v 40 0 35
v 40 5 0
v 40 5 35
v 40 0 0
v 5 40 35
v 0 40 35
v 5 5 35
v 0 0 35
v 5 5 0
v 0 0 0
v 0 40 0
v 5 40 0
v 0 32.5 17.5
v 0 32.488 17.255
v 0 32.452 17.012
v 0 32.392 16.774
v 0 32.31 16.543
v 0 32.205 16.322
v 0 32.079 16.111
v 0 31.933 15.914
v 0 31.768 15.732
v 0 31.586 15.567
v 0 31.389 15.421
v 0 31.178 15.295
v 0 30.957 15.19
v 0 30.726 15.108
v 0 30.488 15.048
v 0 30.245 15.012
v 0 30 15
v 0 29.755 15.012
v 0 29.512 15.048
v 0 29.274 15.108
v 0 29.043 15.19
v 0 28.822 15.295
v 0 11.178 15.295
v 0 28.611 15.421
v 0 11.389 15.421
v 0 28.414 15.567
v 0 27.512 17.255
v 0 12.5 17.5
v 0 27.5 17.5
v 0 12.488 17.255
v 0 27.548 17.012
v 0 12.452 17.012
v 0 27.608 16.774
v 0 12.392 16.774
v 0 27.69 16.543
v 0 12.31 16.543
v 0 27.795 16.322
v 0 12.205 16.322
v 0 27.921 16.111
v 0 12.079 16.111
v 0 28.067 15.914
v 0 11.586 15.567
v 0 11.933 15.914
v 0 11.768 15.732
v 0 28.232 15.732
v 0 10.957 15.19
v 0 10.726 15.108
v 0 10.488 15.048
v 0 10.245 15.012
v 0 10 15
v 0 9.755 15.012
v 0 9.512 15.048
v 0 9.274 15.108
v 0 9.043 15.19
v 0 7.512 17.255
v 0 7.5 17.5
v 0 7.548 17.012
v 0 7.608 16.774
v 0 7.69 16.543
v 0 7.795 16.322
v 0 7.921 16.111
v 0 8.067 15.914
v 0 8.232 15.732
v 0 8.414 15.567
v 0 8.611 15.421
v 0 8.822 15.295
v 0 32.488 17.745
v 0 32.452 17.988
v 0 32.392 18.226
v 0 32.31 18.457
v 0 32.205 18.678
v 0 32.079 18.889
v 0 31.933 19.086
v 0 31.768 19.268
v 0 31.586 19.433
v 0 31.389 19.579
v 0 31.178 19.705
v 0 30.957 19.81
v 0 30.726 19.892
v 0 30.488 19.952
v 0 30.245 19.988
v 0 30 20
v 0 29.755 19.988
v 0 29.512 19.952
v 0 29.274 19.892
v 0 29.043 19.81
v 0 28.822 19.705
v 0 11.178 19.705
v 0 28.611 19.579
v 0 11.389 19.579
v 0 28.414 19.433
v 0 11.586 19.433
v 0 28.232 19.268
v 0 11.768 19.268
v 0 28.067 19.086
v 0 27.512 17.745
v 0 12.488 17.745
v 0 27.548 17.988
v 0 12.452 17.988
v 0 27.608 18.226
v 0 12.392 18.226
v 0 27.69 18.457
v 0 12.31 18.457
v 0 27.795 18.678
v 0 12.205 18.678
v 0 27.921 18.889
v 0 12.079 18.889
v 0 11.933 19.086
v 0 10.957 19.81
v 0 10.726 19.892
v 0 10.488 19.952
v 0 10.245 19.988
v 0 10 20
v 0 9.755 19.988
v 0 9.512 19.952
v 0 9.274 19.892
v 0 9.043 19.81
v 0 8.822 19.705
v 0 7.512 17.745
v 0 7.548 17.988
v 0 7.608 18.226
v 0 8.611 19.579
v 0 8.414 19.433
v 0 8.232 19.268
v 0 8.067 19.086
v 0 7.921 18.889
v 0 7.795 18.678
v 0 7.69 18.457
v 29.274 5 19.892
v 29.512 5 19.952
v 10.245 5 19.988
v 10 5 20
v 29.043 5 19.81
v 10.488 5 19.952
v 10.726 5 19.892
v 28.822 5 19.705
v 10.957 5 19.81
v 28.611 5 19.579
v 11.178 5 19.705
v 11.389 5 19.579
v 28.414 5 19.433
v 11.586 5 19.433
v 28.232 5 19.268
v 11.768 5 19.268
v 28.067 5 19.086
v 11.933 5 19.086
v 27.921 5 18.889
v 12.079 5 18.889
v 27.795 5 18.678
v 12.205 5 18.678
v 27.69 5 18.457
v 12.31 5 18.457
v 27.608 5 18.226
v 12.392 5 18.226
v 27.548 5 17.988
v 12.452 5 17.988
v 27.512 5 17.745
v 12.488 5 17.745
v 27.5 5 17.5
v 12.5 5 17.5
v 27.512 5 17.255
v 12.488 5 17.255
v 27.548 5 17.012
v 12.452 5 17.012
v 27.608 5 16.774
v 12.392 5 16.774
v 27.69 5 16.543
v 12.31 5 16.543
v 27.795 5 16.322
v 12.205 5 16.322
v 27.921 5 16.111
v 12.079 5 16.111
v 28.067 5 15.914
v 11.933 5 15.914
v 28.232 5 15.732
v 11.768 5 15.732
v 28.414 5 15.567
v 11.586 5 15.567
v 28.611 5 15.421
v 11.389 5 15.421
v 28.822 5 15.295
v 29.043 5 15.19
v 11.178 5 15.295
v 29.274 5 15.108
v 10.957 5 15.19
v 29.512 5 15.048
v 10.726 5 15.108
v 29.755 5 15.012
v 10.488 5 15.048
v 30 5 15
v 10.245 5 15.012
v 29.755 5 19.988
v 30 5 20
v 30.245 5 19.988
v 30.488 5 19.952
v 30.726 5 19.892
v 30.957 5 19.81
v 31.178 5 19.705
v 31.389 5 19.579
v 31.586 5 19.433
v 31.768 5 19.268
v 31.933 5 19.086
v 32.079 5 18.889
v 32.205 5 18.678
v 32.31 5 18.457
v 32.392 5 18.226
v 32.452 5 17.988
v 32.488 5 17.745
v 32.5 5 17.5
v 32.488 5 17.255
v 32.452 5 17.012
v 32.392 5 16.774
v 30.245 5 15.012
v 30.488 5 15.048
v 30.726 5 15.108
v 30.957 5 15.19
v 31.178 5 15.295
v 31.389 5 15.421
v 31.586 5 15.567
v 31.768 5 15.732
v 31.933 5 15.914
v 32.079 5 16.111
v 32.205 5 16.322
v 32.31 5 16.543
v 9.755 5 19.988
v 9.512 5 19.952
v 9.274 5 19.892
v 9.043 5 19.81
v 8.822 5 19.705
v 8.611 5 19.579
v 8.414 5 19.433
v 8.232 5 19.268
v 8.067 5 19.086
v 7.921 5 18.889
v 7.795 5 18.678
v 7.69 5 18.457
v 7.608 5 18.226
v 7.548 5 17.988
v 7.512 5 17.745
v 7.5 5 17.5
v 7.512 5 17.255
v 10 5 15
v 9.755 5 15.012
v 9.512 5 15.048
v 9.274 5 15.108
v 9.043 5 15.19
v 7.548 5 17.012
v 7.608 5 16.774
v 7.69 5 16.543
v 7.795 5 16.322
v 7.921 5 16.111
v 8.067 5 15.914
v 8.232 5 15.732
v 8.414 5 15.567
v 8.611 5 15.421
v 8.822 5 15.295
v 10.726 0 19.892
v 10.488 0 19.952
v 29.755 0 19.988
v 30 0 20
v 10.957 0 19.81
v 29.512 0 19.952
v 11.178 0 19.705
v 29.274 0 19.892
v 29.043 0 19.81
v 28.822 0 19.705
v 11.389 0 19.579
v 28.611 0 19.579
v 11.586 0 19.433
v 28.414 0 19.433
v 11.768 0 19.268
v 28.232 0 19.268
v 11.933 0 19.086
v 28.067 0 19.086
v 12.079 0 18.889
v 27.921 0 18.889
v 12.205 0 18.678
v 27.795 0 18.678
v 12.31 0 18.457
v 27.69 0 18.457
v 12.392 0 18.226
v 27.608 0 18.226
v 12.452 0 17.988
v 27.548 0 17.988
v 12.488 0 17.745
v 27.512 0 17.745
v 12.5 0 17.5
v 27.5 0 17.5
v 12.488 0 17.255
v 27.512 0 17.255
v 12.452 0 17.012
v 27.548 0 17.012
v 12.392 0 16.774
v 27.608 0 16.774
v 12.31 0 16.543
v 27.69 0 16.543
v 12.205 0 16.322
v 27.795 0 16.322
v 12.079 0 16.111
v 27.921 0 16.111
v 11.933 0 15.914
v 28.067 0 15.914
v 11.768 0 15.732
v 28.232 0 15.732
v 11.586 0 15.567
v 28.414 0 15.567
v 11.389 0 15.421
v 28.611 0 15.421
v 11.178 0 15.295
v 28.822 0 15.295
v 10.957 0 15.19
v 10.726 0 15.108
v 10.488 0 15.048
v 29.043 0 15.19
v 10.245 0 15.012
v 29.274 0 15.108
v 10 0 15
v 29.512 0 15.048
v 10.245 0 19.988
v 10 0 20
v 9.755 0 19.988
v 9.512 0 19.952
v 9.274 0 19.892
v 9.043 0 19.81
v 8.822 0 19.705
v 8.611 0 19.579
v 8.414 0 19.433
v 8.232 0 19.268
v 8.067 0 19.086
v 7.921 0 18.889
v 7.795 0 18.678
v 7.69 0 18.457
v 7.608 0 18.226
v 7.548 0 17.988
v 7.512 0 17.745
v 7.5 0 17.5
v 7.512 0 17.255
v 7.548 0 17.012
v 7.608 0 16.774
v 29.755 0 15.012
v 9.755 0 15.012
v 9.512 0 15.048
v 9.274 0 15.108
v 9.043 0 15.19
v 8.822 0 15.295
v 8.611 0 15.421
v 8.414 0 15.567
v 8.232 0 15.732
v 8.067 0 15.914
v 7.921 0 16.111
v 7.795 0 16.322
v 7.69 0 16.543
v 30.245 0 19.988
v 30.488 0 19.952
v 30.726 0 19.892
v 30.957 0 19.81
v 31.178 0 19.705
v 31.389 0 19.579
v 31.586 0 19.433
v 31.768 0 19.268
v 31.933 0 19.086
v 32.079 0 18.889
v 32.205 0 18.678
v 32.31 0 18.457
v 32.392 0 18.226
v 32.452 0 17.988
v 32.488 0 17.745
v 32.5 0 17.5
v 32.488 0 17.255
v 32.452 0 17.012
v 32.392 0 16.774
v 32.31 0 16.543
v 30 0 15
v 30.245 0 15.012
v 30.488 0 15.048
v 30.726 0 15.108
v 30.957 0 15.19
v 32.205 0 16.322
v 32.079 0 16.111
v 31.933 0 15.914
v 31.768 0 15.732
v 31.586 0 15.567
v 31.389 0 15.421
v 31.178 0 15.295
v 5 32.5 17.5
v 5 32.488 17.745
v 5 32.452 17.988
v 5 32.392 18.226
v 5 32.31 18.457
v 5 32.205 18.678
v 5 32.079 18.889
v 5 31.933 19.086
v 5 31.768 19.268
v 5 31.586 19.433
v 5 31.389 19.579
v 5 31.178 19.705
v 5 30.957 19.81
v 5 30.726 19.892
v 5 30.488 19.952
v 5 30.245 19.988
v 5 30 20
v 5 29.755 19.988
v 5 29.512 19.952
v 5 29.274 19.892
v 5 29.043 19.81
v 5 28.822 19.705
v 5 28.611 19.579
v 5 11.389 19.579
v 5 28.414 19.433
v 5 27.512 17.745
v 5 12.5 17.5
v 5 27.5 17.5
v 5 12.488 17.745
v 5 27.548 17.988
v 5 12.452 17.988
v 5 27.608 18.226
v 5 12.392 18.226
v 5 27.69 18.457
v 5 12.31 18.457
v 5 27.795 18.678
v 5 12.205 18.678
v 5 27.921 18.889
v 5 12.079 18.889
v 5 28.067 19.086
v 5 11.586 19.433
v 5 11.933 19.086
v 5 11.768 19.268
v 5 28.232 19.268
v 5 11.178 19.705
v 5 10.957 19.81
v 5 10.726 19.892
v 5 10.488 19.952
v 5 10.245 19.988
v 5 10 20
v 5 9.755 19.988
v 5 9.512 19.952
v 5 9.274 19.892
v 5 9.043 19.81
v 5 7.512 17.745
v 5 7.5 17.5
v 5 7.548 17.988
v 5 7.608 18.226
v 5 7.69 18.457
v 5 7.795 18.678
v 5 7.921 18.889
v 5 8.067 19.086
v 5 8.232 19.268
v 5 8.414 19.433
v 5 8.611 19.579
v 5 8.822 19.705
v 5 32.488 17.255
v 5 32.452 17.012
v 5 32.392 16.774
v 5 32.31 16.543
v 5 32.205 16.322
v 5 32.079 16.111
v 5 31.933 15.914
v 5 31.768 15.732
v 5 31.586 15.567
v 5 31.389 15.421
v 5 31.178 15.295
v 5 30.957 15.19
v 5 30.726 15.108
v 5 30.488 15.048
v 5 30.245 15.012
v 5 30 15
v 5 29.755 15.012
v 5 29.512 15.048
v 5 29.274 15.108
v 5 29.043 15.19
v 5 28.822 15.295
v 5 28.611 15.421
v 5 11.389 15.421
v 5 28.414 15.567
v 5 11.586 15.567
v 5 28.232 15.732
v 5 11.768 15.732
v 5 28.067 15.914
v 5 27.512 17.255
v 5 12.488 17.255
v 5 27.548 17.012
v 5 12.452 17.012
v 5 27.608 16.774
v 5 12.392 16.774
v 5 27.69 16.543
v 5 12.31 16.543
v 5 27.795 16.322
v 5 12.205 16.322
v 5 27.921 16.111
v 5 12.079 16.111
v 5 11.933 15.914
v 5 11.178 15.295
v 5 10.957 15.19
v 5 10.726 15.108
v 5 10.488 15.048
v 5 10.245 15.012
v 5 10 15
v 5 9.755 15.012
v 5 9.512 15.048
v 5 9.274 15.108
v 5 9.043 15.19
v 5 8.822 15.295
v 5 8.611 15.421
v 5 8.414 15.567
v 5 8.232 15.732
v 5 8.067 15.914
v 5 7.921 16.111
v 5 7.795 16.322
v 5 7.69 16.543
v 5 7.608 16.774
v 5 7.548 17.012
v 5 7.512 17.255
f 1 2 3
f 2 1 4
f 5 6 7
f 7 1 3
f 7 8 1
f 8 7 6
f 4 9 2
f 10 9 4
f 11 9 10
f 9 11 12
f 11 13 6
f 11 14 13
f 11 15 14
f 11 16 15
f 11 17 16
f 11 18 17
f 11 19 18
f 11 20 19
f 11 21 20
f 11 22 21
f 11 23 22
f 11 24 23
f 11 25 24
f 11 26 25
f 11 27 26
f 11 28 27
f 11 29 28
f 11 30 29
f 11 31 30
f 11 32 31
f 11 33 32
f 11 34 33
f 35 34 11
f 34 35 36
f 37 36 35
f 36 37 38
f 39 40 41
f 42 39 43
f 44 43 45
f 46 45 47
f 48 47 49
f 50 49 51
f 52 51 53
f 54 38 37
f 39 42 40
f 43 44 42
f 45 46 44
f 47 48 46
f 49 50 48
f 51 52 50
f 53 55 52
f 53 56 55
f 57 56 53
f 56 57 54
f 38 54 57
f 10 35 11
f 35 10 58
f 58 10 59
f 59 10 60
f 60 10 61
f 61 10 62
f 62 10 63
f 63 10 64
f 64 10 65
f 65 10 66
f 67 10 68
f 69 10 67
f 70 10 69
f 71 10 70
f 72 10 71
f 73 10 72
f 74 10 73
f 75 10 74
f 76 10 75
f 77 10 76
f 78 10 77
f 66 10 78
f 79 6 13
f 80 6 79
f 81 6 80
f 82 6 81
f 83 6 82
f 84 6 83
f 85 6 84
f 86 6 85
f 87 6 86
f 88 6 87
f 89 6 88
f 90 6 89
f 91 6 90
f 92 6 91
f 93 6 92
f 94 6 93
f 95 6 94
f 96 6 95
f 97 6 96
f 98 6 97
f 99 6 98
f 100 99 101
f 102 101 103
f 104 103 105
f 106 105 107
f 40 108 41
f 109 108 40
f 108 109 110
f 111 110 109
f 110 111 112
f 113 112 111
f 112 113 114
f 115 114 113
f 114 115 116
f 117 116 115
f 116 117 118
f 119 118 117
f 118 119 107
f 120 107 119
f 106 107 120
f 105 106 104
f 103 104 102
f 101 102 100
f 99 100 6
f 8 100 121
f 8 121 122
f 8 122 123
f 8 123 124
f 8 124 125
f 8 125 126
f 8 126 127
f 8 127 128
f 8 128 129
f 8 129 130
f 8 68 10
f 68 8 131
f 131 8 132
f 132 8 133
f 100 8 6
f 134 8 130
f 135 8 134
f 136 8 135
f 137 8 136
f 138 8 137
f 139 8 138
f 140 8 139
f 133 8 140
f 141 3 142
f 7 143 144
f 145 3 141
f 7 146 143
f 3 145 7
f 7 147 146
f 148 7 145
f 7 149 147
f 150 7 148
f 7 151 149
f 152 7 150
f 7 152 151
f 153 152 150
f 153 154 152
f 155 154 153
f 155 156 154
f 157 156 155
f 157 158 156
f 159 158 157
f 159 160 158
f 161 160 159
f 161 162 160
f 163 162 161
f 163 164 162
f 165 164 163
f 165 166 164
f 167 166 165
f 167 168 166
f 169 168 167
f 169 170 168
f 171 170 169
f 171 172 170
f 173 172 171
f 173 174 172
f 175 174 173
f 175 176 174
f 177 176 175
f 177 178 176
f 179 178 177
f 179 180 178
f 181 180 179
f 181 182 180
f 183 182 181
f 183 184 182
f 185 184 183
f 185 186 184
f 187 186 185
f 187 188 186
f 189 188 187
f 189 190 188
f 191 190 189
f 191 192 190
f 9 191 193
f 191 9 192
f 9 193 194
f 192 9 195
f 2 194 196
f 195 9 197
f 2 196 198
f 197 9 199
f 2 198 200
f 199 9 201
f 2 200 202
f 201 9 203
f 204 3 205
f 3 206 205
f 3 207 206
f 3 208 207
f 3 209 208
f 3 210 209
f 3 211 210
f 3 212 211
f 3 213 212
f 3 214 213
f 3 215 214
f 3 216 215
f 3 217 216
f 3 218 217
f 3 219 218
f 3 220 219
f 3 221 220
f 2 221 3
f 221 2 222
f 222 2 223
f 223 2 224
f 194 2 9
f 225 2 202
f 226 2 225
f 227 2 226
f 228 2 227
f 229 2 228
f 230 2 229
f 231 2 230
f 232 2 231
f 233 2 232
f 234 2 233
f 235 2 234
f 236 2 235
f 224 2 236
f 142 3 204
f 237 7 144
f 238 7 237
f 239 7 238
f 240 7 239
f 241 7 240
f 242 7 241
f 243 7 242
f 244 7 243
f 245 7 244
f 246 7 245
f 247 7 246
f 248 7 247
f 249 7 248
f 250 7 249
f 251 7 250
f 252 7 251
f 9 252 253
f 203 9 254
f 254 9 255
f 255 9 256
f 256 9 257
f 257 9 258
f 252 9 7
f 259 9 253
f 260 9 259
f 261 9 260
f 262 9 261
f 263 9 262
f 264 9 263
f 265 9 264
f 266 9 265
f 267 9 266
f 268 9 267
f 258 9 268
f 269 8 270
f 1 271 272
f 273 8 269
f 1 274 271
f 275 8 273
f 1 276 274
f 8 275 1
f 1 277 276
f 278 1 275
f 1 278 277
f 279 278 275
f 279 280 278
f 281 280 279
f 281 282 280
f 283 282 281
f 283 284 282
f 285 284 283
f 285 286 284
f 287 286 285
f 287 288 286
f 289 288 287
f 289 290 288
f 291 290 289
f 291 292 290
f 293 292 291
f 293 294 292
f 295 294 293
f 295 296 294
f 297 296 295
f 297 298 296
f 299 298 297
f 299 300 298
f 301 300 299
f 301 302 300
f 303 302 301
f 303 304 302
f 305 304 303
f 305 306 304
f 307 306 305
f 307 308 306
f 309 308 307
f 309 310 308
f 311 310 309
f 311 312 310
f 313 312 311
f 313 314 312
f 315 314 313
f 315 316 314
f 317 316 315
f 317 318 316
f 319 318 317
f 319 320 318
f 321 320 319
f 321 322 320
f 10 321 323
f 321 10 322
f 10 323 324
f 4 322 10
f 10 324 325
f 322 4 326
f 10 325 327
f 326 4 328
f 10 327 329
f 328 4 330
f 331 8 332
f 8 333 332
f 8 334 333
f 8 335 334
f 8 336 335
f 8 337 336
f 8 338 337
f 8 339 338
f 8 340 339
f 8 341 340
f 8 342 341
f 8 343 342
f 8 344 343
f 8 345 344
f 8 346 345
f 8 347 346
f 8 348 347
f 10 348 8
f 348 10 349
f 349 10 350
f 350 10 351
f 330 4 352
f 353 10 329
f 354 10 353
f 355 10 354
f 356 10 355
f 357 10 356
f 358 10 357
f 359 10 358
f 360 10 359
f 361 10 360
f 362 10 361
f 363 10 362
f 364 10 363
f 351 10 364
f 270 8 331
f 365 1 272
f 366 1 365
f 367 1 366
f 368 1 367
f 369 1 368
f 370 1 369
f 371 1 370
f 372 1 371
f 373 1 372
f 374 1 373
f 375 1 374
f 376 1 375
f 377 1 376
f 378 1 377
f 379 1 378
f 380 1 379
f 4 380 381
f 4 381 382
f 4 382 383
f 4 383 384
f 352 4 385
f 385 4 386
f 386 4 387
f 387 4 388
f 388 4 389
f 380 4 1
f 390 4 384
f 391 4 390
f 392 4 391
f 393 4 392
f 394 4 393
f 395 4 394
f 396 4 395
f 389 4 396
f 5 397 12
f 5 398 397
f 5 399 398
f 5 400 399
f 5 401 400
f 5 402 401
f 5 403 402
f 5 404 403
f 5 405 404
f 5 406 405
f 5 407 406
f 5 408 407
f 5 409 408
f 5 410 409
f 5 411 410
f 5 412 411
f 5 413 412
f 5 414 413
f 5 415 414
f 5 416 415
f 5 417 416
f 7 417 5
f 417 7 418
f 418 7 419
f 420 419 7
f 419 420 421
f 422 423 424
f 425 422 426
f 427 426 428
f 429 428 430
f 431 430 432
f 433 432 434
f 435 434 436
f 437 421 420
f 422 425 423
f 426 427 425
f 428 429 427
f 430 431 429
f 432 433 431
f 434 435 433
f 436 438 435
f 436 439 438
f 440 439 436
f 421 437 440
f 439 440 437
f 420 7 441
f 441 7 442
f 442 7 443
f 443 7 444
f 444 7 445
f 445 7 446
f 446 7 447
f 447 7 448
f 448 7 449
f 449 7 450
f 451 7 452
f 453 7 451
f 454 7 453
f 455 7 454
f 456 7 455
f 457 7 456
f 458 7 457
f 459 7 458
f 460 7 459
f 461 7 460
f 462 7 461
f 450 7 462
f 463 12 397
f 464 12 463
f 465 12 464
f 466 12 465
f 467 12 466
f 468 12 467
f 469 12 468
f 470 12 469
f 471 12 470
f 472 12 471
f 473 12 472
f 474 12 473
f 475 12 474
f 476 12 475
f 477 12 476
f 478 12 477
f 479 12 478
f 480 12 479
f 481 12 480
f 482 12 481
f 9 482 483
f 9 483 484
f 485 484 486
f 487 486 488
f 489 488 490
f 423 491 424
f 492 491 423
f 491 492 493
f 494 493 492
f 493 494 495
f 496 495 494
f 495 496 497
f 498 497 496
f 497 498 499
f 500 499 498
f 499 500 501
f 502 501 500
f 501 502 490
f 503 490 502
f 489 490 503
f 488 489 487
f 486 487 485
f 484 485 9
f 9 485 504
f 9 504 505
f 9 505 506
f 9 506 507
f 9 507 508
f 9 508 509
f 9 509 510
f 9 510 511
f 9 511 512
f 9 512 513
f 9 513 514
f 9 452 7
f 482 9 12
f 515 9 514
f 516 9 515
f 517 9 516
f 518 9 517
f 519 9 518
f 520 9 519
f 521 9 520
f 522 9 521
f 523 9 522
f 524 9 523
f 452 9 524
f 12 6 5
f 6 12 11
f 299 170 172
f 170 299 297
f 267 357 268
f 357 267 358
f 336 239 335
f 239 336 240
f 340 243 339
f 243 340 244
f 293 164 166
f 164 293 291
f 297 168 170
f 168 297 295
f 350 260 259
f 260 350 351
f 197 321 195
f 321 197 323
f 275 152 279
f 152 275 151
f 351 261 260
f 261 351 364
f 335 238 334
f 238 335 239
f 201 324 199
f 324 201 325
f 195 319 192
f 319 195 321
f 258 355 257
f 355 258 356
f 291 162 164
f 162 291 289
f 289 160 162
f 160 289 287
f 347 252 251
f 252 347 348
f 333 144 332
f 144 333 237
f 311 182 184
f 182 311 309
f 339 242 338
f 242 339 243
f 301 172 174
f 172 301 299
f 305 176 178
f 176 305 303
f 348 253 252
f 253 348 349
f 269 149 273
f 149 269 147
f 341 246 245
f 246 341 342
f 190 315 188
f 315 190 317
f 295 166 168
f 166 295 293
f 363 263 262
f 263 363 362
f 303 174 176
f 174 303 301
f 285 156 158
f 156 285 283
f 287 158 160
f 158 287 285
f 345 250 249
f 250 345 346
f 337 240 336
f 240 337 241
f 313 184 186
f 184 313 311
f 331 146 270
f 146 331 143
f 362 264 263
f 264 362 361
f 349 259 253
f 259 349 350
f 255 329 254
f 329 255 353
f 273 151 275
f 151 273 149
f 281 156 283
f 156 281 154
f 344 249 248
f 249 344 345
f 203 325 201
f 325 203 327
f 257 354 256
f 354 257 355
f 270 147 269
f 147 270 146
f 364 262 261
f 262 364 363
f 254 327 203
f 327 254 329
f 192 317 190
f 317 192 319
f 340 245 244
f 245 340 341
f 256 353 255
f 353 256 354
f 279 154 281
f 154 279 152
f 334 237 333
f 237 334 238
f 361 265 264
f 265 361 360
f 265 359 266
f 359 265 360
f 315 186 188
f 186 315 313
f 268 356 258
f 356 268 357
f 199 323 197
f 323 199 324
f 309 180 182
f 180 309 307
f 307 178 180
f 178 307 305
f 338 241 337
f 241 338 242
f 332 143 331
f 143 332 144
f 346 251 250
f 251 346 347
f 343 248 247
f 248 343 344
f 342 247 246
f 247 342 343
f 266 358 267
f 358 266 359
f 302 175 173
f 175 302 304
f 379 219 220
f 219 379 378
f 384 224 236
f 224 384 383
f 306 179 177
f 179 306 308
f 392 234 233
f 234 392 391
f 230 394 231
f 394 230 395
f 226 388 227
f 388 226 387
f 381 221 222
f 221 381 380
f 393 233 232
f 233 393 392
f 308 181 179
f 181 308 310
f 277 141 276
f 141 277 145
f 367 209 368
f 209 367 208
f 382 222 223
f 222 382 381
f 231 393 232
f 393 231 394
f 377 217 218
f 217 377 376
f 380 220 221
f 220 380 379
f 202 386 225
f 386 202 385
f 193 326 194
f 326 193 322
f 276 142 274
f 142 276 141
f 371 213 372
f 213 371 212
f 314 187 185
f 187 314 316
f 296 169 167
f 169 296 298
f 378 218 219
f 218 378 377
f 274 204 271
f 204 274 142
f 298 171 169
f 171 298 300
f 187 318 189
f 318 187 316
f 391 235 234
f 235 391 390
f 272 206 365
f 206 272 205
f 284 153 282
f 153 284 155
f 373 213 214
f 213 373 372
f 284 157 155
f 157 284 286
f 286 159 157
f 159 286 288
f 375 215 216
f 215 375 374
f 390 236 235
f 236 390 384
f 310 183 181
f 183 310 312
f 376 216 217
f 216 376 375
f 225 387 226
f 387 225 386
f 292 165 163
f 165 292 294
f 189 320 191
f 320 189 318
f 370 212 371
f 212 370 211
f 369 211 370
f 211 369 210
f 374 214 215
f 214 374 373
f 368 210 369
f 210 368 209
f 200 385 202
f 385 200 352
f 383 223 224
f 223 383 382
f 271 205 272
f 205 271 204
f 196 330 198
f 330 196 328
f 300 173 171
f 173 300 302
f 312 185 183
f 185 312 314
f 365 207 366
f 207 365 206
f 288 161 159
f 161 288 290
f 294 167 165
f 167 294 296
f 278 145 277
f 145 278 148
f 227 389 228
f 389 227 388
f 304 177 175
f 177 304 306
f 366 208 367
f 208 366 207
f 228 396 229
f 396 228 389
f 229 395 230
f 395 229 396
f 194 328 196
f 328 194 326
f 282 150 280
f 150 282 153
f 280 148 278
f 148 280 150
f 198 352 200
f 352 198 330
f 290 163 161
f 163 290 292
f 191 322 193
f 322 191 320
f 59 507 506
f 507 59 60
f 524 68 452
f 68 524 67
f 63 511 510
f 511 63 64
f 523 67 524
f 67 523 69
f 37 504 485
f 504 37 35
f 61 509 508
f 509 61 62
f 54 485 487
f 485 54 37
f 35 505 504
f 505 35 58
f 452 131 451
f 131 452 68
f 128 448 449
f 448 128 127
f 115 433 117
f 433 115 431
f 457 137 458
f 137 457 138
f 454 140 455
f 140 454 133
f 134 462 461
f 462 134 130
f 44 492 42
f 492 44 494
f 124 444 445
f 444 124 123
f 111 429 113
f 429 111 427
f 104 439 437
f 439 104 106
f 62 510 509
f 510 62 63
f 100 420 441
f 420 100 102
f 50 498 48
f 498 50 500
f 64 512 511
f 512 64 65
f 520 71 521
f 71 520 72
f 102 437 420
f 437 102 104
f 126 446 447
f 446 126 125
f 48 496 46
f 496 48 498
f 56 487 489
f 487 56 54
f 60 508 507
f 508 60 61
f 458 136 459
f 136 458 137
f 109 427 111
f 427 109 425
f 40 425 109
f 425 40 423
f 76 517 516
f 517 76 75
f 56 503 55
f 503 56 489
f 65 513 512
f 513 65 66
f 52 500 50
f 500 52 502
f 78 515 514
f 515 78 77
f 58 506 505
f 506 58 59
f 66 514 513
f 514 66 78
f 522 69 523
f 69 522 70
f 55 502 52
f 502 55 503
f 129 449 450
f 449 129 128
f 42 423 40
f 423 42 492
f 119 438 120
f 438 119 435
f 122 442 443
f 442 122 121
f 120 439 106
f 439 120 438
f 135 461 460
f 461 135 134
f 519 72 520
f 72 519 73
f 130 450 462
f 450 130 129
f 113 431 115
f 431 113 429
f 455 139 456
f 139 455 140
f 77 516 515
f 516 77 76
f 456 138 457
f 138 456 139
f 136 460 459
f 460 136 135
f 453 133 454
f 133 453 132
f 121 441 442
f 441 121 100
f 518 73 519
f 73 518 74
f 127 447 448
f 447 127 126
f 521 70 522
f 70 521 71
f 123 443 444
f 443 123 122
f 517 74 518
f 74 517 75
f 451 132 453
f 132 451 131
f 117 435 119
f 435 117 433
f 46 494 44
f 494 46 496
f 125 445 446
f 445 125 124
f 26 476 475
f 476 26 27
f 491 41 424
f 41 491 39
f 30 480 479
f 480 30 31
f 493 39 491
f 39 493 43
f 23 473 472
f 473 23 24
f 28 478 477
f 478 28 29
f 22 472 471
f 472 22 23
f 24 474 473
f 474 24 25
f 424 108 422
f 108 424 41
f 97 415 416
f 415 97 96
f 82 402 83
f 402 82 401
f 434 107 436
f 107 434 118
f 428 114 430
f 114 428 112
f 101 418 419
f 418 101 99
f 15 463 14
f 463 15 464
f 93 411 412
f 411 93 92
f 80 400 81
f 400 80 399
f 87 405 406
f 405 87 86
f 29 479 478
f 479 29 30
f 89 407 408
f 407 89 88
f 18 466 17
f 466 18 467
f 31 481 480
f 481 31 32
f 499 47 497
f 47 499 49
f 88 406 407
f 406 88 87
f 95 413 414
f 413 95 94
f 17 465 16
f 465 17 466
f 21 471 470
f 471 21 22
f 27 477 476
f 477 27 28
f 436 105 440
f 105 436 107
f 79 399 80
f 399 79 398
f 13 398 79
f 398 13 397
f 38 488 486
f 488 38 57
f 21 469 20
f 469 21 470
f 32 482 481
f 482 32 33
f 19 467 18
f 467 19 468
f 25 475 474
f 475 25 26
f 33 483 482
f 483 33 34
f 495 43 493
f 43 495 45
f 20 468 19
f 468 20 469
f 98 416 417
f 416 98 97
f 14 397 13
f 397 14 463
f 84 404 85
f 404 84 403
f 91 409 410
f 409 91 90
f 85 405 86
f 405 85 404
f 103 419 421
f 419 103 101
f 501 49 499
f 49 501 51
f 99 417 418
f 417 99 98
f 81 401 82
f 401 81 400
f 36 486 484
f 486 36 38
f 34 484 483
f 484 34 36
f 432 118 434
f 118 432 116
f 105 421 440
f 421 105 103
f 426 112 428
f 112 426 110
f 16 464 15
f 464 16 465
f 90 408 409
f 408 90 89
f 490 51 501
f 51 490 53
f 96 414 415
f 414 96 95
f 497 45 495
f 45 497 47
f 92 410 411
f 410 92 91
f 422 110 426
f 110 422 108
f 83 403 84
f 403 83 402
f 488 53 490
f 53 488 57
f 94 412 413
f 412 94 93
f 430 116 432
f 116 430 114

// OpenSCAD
$fn = 64;

// Target overall size: [40, 40, 35]
footprint = 40;
height    = 35;

// Bracket wall thickness (typical for 40-series corner brackets)
t = 5;

// Holes (simple through-holes on each leg)
hole_d = 5;
hole_offset = 10;   // from outer edges along the leg
overlap = 0.2;      // small overlap to ensure boolean robustness

module extrusion_bracket_40x40x35() {
    difference() {
        // ONE connected solid: L-bracket made from two plates that overlap at the corner
        union() {
            // Leg A: along X, thickness in Y
            cube([footprint, t, height], center=false);

            // Leg B: along Y, thickness in X
            cube([t, footprint, height], center=false);
        }

        // Through-holes on Leg A (drilled along Y)
        for (x = [hole_offset, footprint - hole_offset]) {
            translate([x, t/2, height/2])
                rotate([90, 0, 0])
                    cylinder(h = t + 2*overlap, d = hole_d, center=true);
        }

        // Through-holes on Leg B (drilled along X)
        for (y = [hole_offset, footprint - hole_offset]) {
            translate([t/2, y, height/2])
                rotate([0, 90, 0])
                    cylinder(h = t + 2*overlap, d = hole_d, center=true);
        }
    }
}

extrusion_bracket_40x40x35();
